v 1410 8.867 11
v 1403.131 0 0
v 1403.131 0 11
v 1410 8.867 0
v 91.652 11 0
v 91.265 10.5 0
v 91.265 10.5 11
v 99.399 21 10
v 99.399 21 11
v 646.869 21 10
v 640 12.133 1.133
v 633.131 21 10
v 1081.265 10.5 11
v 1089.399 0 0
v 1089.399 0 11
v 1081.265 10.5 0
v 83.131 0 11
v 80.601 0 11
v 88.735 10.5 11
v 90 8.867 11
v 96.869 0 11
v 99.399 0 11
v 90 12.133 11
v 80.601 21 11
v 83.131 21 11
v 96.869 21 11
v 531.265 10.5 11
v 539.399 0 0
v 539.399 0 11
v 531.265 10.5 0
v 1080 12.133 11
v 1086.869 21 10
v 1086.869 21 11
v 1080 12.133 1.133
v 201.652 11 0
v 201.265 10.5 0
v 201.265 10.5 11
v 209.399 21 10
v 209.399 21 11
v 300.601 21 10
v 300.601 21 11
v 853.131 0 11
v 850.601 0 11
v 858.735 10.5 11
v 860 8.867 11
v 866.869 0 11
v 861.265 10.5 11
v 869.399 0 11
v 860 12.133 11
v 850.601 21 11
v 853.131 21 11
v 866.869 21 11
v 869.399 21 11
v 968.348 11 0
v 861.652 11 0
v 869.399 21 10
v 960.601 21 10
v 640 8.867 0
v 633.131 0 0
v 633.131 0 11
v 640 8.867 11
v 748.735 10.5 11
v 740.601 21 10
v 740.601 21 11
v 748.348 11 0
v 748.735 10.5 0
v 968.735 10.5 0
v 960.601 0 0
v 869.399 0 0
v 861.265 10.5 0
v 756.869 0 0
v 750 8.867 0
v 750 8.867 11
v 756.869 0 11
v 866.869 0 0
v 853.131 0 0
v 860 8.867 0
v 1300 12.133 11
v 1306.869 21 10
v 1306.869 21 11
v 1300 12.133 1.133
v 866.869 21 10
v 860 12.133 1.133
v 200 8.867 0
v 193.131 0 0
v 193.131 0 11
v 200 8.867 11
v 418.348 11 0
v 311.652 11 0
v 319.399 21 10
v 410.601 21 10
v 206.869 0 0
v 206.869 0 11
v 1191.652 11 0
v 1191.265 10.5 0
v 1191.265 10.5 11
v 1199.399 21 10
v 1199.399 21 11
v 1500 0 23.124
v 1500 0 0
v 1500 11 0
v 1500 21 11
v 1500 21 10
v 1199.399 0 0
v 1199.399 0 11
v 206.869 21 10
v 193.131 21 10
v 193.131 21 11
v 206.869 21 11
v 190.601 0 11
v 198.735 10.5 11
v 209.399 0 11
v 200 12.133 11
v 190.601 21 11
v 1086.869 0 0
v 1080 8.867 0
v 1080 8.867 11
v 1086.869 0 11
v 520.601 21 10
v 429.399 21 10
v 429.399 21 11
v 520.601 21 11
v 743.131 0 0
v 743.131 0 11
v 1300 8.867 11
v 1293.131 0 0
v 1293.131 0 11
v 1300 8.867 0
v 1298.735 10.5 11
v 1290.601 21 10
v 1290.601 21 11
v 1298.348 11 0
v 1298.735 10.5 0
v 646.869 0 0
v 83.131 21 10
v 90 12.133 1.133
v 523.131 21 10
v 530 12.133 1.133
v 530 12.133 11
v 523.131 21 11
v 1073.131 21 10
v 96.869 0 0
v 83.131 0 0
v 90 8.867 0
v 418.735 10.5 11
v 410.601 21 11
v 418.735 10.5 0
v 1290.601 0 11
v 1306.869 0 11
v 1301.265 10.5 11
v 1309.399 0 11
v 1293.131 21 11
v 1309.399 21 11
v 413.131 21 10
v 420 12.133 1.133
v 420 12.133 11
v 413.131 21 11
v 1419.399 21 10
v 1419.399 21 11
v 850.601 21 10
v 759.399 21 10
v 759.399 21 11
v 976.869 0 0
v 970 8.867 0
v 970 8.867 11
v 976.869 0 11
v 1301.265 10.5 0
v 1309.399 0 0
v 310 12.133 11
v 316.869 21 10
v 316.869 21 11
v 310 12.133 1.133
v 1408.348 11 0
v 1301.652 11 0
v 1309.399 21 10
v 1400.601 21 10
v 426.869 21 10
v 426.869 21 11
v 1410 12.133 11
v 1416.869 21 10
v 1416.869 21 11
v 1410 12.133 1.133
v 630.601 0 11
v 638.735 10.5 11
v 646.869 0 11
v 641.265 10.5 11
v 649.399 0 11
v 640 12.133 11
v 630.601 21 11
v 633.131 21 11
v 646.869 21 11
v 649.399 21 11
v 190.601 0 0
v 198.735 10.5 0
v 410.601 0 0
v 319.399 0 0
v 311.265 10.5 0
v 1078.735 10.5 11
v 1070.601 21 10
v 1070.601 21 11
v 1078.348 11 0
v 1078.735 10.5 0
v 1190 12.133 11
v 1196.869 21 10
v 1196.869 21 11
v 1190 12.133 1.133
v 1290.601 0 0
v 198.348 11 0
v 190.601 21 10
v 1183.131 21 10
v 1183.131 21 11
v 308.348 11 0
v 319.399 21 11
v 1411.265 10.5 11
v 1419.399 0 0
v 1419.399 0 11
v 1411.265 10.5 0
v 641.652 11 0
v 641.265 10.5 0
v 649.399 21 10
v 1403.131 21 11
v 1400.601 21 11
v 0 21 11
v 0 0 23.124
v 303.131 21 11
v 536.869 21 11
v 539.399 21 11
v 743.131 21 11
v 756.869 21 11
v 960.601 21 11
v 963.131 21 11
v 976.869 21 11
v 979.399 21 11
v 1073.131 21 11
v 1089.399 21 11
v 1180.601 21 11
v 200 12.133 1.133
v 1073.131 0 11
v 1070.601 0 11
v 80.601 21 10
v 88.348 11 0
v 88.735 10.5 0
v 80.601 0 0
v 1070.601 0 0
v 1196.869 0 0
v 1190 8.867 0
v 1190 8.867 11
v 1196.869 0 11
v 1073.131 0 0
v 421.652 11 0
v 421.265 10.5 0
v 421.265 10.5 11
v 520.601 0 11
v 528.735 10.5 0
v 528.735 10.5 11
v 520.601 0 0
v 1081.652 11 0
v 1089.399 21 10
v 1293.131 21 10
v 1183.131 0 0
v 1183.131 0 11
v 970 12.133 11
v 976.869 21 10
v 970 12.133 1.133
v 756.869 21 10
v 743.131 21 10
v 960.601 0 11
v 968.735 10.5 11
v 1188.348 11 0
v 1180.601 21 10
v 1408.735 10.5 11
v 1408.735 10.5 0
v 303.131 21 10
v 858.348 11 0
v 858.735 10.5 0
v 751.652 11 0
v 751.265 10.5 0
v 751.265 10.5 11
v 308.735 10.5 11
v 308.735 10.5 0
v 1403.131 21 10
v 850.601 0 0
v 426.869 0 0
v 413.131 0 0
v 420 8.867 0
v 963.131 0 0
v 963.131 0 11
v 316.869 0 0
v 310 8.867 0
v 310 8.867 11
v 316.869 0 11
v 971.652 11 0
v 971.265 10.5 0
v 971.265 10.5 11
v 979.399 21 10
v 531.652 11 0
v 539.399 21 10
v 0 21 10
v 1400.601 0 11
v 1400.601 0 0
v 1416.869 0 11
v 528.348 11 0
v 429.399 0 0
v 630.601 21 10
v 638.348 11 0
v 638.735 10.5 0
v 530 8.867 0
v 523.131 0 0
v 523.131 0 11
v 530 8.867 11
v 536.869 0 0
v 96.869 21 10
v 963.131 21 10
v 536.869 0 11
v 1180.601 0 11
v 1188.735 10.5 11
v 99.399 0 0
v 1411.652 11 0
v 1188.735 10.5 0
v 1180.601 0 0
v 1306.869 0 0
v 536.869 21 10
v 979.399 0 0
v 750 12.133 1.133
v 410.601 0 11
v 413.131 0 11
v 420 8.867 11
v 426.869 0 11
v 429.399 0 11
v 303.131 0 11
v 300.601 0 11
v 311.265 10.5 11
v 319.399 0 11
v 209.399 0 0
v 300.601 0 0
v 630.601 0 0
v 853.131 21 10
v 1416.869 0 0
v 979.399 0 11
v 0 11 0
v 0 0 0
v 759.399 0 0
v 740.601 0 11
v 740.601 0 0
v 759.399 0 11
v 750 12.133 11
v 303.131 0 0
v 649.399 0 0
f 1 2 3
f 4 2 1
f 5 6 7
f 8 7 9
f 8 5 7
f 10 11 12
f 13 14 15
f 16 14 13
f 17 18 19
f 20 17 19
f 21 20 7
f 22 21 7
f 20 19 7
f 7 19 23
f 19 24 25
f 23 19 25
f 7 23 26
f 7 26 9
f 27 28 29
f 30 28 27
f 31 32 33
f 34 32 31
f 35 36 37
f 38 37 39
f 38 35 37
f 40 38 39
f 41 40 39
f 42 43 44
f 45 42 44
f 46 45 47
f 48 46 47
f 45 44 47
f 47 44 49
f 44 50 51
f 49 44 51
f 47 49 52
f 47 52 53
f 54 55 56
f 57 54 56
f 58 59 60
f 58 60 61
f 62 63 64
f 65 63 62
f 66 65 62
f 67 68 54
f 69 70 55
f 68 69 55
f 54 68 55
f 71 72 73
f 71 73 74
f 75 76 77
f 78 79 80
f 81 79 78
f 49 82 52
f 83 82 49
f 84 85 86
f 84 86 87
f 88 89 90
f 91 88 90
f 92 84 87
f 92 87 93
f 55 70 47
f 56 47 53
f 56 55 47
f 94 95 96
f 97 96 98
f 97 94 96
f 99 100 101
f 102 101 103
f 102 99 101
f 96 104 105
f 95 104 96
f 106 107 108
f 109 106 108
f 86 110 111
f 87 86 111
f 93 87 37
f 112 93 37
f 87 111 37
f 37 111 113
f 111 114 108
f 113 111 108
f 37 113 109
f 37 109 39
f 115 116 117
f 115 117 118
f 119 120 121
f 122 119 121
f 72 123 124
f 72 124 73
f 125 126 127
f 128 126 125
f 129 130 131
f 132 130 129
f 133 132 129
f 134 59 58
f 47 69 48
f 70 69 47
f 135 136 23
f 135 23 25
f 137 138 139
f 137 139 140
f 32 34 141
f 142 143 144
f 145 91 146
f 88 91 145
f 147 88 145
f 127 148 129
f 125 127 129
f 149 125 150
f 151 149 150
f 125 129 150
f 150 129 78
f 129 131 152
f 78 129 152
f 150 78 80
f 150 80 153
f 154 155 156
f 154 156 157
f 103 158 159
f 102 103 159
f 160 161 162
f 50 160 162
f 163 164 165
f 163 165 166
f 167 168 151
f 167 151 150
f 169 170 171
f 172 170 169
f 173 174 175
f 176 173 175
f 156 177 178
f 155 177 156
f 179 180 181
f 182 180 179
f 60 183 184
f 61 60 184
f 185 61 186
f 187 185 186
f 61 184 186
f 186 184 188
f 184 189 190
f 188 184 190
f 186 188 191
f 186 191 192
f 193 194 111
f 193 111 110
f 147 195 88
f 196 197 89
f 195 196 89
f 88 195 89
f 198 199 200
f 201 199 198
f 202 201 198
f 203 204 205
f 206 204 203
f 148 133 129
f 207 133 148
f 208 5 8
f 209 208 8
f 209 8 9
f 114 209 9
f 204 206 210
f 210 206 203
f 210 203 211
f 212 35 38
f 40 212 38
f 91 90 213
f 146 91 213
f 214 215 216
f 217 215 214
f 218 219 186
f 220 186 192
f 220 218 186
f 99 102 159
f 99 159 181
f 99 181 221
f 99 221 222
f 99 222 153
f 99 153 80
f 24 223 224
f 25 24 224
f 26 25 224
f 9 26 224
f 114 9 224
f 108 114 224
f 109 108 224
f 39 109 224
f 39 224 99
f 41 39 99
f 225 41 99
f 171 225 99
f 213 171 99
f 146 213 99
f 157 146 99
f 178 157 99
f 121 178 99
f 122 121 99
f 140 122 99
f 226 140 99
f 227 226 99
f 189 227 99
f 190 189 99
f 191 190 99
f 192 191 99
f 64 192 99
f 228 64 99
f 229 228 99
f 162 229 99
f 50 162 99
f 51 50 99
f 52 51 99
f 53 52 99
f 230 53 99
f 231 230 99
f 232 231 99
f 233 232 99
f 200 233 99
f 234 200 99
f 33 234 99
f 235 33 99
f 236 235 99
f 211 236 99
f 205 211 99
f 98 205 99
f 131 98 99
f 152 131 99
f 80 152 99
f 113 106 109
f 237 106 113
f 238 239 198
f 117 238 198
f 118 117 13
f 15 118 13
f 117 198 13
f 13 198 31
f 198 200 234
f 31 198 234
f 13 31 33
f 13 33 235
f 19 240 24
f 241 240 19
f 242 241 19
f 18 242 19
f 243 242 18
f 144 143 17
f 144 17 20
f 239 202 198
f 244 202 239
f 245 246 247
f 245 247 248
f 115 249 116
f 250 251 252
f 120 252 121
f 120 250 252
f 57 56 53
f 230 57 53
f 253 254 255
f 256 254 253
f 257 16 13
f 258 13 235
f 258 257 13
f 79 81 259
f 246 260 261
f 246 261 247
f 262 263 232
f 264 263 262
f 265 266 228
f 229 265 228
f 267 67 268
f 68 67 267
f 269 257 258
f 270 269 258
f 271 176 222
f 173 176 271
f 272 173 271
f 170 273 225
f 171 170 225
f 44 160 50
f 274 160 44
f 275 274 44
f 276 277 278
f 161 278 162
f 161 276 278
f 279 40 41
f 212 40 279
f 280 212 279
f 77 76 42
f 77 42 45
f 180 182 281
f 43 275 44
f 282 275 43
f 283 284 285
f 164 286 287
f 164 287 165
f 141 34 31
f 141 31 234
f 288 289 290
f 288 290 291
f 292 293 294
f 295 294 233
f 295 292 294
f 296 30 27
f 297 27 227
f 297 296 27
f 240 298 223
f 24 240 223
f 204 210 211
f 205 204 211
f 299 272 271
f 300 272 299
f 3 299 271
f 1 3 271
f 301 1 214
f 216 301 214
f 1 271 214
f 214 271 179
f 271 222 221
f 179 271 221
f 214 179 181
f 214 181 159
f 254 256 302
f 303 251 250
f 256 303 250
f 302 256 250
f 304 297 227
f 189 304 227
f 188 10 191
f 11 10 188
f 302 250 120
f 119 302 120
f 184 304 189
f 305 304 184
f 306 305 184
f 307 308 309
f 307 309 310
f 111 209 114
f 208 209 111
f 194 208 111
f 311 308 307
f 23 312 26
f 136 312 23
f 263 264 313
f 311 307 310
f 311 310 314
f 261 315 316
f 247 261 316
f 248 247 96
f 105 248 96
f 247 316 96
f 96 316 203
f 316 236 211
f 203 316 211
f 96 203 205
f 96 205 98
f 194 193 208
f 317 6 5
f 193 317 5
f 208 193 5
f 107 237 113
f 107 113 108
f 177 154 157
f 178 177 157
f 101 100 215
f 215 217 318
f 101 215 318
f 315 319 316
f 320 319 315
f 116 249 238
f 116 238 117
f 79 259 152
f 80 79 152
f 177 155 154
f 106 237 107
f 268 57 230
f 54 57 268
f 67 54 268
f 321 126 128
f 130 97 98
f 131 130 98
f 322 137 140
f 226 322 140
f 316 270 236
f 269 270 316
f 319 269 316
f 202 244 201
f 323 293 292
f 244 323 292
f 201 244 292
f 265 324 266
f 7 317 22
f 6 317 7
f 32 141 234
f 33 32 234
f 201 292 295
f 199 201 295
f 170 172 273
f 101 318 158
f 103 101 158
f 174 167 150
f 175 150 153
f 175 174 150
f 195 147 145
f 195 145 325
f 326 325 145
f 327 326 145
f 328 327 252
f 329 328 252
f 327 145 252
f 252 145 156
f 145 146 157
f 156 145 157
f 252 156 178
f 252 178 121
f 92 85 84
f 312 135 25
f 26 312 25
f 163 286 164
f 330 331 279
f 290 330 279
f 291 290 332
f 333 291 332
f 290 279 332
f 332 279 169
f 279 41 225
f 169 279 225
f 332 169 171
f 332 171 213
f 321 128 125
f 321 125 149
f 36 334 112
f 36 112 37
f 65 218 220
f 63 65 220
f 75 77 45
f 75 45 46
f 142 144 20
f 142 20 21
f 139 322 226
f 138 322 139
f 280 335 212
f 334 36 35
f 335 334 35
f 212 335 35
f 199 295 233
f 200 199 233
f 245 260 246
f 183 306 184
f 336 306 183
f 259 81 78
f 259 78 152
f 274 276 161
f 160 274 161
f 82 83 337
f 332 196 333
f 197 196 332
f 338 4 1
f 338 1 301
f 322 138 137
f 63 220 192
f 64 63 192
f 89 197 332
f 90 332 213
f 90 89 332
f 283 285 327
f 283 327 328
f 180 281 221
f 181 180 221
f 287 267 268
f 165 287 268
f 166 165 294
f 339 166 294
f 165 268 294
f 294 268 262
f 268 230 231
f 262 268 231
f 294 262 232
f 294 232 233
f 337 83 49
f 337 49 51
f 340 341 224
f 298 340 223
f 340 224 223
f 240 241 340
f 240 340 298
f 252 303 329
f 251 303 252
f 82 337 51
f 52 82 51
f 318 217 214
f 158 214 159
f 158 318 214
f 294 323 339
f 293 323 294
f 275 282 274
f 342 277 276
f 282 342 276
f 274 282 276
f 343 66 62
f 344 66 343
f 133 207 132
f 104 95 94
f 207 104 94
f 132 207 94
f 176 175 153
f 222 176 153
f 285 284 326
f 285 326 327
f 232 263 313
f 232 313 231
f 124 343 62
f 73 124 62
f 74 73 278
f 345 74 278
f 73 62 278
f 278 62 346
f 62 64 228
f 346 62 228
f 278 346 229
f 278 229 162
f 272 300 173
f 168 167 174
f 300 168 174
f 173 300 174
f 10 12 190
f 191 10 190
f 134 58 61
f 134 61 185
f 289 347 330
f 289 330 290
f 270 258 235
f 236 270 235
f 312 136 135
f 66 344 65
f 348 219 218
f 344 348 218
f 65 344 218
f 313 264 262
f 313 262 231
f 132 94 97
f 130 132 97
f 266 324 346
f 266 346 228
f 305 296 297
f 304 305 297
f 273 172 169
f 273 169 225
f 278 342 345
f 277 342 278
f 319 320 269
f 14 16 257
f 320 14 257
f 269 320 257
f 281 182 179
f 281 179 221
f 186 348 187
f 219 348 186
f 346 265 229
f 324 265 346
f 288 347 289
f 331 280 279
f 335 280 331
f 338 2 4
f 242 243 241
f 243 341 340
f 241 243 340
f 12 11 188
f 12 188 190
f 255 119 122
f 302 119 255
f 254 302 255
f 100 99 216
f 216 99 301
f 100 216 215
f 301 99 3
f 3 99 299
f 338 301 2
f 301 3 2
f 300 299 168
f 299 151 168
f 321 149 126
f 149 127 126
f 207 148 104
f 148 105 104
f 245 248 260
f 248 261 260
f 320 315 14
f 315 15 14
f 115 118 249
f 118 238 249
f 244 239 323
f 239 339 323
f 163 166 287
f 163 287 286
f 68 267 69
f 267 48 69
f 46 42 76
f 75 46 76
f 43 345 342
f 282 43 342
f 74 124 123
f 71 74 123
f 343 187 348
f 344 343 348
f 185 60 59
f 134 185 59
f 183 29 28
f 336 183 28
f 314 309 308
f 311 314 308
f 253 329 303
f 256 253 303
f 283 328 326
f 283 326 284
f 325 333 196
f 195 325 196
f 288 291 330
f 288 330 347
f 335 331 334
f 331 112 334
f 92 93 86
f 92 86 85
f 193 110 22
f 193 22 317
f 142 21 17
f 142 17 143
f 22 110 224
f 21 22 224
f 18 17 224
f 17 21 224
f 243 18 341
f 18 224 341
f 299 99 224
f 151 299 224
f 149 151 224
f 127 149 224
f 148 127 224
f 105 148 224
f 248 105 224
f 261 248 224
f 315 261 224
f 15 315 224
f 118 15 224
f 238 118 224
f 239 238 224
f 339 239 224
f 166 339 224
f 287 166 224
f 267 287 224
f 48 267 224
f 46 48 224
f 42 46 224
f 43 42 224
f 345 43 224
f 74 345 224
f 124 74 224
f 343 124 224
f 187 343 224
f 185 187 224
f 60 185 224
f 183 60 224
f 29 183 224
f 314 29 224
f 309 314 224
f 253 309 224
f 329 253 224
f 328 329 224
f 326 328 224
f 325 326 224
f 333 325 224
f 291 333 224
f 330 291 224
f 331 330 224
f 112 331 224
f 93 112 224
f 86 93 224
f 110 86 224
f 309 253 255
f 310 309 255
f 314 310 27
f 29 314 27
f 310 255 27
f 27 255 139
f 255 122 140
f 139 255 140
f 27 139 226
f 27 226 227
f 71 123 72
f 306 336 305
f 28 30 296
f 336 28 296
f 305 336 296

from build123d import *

# Parameters (mm, degrees)
PAD004_DEPTH        = 1500
POCKET003_DEPTH     = 11
LINEARPATTERN_COUNT = 14
LINEARPATTERN_PITCH = 110


with BuildPart() as part:
    # Sketch008 → Pad004 (new body)
    with BuildSketch(Plane.YZ):
        Polygon((0, 0), (11, 0), (21, 10), (21, 11), (0, 23.124356), align=None)
    extrude(amount=PAD004_DEPTH)

    # Sketch009 → Pocket003 (cut)
    with BuildSketch(Plane.XY):
        Polygon((6.70945, 46.612398), (8.29055, 45.387602), (35, 79.867074), (88.735058, 10.5), (78.064124, -3.275205), (79.645224, -4.5), (90, 8.867074), (100.354776, -4.5), (101.935876, -3.275205), (91.264942, 10.5), (118.29055, 45.387602), (116.70945, 46.612398), (90, 12.132926), (36.264942, 81.5), (46.935876, 95.275205), (45.354776, 96.5), (35, 83.132926), (24.645224, 96.5), (23.064124, 95.275205), (33.735058, 81.5), align=None)
    pocket003 = extrude(amount=POCKET003_DEPTH, mode=Mode.SUBTRACT)

    # LinearPattern: Pocket003 ×14
    with Locations(*[(i * LINEARPATTERN_PITCH, 0, 0) for i in range(1, LINEARPATTERN_COUNT)]):
        add(pocket003, mode=Mode.SUBTRACT)


solid = part.part
